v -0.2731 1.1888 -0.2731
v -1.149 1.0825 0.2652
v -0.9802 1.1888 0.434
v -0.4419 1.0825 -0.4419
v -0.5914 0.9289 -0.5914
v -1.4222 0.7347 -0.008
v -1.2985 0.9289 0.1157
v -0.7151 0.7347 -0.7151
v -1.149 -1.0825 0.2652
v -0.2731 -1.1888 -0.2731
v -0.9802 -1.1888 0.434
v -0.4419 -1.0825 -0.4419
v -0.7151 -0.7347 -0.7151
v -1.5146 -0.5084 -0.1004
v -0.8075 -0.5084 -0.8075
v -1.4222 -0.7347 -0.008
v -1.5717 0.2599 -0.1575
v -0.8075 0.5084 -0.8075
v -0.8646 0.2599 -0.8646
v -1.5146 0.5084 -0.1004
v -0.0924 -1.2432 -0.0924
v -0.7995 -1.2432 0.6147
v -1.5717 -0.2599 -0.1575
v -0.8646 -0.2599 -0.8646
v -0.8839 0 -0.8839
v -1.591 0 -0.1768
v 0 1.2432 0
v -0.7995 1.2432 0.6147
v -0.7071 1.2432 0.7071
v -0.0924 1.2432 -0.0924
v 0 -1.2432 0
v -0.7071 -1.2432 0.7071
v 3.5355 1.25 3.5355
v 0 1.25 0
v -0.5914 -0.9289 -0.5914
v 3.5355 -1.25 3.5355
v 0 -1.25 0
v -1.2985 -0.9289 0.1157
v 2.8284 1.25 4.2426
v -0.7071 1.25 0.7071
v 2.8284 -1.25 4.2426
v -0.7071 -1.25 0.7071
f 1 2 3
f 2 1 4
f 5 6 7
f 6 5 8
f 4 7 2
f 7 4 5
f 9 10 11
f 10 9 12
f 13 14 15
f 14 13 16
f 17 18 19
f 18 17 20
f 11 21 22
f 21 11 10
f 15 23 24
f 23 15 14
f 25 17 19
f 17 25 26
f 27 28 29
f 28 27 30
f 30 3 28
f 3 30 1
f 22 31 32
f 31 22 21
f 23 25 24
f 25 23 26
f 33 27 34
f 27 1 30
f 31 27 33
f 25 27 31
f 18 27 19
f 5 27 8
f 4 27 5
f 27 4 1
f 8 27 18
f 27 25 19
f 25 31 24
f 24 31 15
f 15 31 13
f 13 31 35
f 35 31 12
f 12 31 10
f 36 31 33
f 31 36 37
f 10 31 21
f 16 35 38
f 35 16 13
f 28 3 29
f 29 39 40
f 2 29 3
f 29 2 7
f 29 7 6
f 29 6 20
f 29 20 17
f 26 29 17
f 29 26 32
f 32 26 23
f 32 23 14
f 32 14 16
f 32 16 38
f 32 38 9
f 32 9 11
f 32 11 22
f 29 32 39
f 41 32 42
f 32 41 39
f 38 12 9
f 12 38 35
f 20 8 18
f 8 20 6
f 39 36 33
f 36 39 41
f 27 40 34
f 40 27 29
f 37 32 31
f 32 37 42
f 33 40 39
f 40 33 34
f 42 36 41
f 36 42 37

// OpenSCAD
$fn =30;
module peghole(){
    color("Blue")cylinder (6, .8, .8, true);
}
// the peg hole template, a change in size here changes hole everywhere
module peg(){
    cylinder (6, .8, .8, true);
}

module edge(){
cylinder (5, 3.25, 3.25, true);
}
// a cylinder for making block


module block(){
    intersection(){
edge();
rotate([90,0,0]) edge();
rotate([0, 90, 0]) edge();
}
}
// create the base cube without the holes


module blox(){
difference(){ 
block();
   peghole();
rotate ([90, 0, 0]) peghole();
rotate ([0, 90, 0]) peghole();
}
}
//unembeleshed blox cube

module cross(){
blox();
translate([5,0,0]) blox();
translate([-5,0,0]) blox();
translate([0,0,5]) blox();
translate([0,0,-5]) blox();
}
// central blox cross

module corner(){difference(){
    block();
   translate([-3,-3,3])rotate([0,45,0])
cube([8,6
   ,4]) color("Red");
 rotate([0,90,0])
   translate([0,0,-4]) peghole();
 translate([0,0,-4]) peghole();   
 rotate([0,45,0]) translate([0,0,1])peghole();   
}
}
    
//anled blox piece

module side(){
    blox();
    translate([0,0,5])corner();
translate([0,0,-5]) rotate([0,90,0]) corner();
}
// Pentagram side of octagon, can be own piece

module 3long() {
    blox();
    translate([0,0,5]) blox();
    translate([0,0,-5]) blox();
}

module opcorner(){
    translate([5,0,5]) corner();
translate([-5,0,-5]) rotate([0,180,0])corner();
}
// unused now

module oct() {
3long();
translate([5,0,0]) side();
translate([-5,0,0]) rotate([0,180,0]) side();
}
// one octagon of blox, can be used as own piece

module longside() {
side();
translate([0,5,0]) side();
translate([0,-5,0]) side();
}
// long side can be used as own piece

module hexlong(){
longside();
translate([-5,0,0]) rotate([0,180,0]) longside();
}
// long side in the combined form, usable as piece

module 3X3() {
3long();
translate([0,5,0]) 3long();
translate([0,-5,0]) 3long();
}
// plate of 3X3 blox can be used as own piece

module long(){
    oct();
translate([0,5,0]) oct();
translate([0,-5,0]) oct();
}
// octoganal tube with solid fill

module longhollow(){
difference(){
long();
cube([10,10,5], true);
cube([5,10,10], true);
}
}
// lighter octoganal tube

module test(){
translate([0,0,10]) blox();
rotate([0,45,0]) translate([0,0,9.5]) blox();
}
// set up angle for bracket design
module core() {
    color("Red") translate([0,0,2.5]) blox();
    color("Red");
}
//core();
module caplower(){
CapPoints = [ [0,7.5,0],[5,2.5,0],[5,-2.5,0],[0,-7.5,0],[0,2.35,4.6],[2.35,2.35,4.6],[2.35,-2.35,4.6],[0,-2.35,4.6] ];
CapFaces = [ [0,1,2,3],[1,0,5],[3,2,6],[3,6,7],[3,7,4,0],[2,1,5,6],[5,4,7,6],[4,5,0] ];
polyhedron(CapPoints, CapFaces,convexity = 1);
}
// creates a cap with a petruding blox, needs finetuning
module halfflatcap() {
    CapPoints = [ [0,7.5,0],[5,2.5,0],[5,-2.5,0],[0,-7.5,0],[0,2.5,5],[2.5,2.5,5],[2.5,-2.5,5],[0,-2.5,5] ];
CapFaces = [ [3,2,1,0],[5,0,1],[6,2,3],[7,6,3],[0,4,7,3],[6,5,1,2],[6,7,4,5],[0,5,4] ];
difference(){
    polyhedron(CapPoints, CapFaces,convexity = 1);
translate([2.5,0,-1]) peghole();
translate([0,0,4]) peghole();
}
}
// make half a cao for hex with sides flush with top of blox
module fulflatcap() {
    halfflatcap();
rotate ([0,0,180]) halfflatcap();
}

// make cap for hex with sides flush with top of blox
//no holes yet

module bracketbase(){
    difference(){
rotate([0,30,0])translate([1,0,-1]) cube([5,3,5], true);
translate([-2.5,0,-10]) test();
 translate([-4,-3,-3])cube([3,5,5]);translate([-.5,0,-4.5])rotate([0,30,0]) cube(4.1, true);translate([-4,-2,-5])cube(4);    
  }
}
// bracket for between wings
//translate([0,0,3]) blox();
module bracketend(){
cylinder(1,1.25,1.25);
translate([0,-1.25,0]) cube([5,2.5,1]);
}
rotate ([0,-45,0]) bracketend();
